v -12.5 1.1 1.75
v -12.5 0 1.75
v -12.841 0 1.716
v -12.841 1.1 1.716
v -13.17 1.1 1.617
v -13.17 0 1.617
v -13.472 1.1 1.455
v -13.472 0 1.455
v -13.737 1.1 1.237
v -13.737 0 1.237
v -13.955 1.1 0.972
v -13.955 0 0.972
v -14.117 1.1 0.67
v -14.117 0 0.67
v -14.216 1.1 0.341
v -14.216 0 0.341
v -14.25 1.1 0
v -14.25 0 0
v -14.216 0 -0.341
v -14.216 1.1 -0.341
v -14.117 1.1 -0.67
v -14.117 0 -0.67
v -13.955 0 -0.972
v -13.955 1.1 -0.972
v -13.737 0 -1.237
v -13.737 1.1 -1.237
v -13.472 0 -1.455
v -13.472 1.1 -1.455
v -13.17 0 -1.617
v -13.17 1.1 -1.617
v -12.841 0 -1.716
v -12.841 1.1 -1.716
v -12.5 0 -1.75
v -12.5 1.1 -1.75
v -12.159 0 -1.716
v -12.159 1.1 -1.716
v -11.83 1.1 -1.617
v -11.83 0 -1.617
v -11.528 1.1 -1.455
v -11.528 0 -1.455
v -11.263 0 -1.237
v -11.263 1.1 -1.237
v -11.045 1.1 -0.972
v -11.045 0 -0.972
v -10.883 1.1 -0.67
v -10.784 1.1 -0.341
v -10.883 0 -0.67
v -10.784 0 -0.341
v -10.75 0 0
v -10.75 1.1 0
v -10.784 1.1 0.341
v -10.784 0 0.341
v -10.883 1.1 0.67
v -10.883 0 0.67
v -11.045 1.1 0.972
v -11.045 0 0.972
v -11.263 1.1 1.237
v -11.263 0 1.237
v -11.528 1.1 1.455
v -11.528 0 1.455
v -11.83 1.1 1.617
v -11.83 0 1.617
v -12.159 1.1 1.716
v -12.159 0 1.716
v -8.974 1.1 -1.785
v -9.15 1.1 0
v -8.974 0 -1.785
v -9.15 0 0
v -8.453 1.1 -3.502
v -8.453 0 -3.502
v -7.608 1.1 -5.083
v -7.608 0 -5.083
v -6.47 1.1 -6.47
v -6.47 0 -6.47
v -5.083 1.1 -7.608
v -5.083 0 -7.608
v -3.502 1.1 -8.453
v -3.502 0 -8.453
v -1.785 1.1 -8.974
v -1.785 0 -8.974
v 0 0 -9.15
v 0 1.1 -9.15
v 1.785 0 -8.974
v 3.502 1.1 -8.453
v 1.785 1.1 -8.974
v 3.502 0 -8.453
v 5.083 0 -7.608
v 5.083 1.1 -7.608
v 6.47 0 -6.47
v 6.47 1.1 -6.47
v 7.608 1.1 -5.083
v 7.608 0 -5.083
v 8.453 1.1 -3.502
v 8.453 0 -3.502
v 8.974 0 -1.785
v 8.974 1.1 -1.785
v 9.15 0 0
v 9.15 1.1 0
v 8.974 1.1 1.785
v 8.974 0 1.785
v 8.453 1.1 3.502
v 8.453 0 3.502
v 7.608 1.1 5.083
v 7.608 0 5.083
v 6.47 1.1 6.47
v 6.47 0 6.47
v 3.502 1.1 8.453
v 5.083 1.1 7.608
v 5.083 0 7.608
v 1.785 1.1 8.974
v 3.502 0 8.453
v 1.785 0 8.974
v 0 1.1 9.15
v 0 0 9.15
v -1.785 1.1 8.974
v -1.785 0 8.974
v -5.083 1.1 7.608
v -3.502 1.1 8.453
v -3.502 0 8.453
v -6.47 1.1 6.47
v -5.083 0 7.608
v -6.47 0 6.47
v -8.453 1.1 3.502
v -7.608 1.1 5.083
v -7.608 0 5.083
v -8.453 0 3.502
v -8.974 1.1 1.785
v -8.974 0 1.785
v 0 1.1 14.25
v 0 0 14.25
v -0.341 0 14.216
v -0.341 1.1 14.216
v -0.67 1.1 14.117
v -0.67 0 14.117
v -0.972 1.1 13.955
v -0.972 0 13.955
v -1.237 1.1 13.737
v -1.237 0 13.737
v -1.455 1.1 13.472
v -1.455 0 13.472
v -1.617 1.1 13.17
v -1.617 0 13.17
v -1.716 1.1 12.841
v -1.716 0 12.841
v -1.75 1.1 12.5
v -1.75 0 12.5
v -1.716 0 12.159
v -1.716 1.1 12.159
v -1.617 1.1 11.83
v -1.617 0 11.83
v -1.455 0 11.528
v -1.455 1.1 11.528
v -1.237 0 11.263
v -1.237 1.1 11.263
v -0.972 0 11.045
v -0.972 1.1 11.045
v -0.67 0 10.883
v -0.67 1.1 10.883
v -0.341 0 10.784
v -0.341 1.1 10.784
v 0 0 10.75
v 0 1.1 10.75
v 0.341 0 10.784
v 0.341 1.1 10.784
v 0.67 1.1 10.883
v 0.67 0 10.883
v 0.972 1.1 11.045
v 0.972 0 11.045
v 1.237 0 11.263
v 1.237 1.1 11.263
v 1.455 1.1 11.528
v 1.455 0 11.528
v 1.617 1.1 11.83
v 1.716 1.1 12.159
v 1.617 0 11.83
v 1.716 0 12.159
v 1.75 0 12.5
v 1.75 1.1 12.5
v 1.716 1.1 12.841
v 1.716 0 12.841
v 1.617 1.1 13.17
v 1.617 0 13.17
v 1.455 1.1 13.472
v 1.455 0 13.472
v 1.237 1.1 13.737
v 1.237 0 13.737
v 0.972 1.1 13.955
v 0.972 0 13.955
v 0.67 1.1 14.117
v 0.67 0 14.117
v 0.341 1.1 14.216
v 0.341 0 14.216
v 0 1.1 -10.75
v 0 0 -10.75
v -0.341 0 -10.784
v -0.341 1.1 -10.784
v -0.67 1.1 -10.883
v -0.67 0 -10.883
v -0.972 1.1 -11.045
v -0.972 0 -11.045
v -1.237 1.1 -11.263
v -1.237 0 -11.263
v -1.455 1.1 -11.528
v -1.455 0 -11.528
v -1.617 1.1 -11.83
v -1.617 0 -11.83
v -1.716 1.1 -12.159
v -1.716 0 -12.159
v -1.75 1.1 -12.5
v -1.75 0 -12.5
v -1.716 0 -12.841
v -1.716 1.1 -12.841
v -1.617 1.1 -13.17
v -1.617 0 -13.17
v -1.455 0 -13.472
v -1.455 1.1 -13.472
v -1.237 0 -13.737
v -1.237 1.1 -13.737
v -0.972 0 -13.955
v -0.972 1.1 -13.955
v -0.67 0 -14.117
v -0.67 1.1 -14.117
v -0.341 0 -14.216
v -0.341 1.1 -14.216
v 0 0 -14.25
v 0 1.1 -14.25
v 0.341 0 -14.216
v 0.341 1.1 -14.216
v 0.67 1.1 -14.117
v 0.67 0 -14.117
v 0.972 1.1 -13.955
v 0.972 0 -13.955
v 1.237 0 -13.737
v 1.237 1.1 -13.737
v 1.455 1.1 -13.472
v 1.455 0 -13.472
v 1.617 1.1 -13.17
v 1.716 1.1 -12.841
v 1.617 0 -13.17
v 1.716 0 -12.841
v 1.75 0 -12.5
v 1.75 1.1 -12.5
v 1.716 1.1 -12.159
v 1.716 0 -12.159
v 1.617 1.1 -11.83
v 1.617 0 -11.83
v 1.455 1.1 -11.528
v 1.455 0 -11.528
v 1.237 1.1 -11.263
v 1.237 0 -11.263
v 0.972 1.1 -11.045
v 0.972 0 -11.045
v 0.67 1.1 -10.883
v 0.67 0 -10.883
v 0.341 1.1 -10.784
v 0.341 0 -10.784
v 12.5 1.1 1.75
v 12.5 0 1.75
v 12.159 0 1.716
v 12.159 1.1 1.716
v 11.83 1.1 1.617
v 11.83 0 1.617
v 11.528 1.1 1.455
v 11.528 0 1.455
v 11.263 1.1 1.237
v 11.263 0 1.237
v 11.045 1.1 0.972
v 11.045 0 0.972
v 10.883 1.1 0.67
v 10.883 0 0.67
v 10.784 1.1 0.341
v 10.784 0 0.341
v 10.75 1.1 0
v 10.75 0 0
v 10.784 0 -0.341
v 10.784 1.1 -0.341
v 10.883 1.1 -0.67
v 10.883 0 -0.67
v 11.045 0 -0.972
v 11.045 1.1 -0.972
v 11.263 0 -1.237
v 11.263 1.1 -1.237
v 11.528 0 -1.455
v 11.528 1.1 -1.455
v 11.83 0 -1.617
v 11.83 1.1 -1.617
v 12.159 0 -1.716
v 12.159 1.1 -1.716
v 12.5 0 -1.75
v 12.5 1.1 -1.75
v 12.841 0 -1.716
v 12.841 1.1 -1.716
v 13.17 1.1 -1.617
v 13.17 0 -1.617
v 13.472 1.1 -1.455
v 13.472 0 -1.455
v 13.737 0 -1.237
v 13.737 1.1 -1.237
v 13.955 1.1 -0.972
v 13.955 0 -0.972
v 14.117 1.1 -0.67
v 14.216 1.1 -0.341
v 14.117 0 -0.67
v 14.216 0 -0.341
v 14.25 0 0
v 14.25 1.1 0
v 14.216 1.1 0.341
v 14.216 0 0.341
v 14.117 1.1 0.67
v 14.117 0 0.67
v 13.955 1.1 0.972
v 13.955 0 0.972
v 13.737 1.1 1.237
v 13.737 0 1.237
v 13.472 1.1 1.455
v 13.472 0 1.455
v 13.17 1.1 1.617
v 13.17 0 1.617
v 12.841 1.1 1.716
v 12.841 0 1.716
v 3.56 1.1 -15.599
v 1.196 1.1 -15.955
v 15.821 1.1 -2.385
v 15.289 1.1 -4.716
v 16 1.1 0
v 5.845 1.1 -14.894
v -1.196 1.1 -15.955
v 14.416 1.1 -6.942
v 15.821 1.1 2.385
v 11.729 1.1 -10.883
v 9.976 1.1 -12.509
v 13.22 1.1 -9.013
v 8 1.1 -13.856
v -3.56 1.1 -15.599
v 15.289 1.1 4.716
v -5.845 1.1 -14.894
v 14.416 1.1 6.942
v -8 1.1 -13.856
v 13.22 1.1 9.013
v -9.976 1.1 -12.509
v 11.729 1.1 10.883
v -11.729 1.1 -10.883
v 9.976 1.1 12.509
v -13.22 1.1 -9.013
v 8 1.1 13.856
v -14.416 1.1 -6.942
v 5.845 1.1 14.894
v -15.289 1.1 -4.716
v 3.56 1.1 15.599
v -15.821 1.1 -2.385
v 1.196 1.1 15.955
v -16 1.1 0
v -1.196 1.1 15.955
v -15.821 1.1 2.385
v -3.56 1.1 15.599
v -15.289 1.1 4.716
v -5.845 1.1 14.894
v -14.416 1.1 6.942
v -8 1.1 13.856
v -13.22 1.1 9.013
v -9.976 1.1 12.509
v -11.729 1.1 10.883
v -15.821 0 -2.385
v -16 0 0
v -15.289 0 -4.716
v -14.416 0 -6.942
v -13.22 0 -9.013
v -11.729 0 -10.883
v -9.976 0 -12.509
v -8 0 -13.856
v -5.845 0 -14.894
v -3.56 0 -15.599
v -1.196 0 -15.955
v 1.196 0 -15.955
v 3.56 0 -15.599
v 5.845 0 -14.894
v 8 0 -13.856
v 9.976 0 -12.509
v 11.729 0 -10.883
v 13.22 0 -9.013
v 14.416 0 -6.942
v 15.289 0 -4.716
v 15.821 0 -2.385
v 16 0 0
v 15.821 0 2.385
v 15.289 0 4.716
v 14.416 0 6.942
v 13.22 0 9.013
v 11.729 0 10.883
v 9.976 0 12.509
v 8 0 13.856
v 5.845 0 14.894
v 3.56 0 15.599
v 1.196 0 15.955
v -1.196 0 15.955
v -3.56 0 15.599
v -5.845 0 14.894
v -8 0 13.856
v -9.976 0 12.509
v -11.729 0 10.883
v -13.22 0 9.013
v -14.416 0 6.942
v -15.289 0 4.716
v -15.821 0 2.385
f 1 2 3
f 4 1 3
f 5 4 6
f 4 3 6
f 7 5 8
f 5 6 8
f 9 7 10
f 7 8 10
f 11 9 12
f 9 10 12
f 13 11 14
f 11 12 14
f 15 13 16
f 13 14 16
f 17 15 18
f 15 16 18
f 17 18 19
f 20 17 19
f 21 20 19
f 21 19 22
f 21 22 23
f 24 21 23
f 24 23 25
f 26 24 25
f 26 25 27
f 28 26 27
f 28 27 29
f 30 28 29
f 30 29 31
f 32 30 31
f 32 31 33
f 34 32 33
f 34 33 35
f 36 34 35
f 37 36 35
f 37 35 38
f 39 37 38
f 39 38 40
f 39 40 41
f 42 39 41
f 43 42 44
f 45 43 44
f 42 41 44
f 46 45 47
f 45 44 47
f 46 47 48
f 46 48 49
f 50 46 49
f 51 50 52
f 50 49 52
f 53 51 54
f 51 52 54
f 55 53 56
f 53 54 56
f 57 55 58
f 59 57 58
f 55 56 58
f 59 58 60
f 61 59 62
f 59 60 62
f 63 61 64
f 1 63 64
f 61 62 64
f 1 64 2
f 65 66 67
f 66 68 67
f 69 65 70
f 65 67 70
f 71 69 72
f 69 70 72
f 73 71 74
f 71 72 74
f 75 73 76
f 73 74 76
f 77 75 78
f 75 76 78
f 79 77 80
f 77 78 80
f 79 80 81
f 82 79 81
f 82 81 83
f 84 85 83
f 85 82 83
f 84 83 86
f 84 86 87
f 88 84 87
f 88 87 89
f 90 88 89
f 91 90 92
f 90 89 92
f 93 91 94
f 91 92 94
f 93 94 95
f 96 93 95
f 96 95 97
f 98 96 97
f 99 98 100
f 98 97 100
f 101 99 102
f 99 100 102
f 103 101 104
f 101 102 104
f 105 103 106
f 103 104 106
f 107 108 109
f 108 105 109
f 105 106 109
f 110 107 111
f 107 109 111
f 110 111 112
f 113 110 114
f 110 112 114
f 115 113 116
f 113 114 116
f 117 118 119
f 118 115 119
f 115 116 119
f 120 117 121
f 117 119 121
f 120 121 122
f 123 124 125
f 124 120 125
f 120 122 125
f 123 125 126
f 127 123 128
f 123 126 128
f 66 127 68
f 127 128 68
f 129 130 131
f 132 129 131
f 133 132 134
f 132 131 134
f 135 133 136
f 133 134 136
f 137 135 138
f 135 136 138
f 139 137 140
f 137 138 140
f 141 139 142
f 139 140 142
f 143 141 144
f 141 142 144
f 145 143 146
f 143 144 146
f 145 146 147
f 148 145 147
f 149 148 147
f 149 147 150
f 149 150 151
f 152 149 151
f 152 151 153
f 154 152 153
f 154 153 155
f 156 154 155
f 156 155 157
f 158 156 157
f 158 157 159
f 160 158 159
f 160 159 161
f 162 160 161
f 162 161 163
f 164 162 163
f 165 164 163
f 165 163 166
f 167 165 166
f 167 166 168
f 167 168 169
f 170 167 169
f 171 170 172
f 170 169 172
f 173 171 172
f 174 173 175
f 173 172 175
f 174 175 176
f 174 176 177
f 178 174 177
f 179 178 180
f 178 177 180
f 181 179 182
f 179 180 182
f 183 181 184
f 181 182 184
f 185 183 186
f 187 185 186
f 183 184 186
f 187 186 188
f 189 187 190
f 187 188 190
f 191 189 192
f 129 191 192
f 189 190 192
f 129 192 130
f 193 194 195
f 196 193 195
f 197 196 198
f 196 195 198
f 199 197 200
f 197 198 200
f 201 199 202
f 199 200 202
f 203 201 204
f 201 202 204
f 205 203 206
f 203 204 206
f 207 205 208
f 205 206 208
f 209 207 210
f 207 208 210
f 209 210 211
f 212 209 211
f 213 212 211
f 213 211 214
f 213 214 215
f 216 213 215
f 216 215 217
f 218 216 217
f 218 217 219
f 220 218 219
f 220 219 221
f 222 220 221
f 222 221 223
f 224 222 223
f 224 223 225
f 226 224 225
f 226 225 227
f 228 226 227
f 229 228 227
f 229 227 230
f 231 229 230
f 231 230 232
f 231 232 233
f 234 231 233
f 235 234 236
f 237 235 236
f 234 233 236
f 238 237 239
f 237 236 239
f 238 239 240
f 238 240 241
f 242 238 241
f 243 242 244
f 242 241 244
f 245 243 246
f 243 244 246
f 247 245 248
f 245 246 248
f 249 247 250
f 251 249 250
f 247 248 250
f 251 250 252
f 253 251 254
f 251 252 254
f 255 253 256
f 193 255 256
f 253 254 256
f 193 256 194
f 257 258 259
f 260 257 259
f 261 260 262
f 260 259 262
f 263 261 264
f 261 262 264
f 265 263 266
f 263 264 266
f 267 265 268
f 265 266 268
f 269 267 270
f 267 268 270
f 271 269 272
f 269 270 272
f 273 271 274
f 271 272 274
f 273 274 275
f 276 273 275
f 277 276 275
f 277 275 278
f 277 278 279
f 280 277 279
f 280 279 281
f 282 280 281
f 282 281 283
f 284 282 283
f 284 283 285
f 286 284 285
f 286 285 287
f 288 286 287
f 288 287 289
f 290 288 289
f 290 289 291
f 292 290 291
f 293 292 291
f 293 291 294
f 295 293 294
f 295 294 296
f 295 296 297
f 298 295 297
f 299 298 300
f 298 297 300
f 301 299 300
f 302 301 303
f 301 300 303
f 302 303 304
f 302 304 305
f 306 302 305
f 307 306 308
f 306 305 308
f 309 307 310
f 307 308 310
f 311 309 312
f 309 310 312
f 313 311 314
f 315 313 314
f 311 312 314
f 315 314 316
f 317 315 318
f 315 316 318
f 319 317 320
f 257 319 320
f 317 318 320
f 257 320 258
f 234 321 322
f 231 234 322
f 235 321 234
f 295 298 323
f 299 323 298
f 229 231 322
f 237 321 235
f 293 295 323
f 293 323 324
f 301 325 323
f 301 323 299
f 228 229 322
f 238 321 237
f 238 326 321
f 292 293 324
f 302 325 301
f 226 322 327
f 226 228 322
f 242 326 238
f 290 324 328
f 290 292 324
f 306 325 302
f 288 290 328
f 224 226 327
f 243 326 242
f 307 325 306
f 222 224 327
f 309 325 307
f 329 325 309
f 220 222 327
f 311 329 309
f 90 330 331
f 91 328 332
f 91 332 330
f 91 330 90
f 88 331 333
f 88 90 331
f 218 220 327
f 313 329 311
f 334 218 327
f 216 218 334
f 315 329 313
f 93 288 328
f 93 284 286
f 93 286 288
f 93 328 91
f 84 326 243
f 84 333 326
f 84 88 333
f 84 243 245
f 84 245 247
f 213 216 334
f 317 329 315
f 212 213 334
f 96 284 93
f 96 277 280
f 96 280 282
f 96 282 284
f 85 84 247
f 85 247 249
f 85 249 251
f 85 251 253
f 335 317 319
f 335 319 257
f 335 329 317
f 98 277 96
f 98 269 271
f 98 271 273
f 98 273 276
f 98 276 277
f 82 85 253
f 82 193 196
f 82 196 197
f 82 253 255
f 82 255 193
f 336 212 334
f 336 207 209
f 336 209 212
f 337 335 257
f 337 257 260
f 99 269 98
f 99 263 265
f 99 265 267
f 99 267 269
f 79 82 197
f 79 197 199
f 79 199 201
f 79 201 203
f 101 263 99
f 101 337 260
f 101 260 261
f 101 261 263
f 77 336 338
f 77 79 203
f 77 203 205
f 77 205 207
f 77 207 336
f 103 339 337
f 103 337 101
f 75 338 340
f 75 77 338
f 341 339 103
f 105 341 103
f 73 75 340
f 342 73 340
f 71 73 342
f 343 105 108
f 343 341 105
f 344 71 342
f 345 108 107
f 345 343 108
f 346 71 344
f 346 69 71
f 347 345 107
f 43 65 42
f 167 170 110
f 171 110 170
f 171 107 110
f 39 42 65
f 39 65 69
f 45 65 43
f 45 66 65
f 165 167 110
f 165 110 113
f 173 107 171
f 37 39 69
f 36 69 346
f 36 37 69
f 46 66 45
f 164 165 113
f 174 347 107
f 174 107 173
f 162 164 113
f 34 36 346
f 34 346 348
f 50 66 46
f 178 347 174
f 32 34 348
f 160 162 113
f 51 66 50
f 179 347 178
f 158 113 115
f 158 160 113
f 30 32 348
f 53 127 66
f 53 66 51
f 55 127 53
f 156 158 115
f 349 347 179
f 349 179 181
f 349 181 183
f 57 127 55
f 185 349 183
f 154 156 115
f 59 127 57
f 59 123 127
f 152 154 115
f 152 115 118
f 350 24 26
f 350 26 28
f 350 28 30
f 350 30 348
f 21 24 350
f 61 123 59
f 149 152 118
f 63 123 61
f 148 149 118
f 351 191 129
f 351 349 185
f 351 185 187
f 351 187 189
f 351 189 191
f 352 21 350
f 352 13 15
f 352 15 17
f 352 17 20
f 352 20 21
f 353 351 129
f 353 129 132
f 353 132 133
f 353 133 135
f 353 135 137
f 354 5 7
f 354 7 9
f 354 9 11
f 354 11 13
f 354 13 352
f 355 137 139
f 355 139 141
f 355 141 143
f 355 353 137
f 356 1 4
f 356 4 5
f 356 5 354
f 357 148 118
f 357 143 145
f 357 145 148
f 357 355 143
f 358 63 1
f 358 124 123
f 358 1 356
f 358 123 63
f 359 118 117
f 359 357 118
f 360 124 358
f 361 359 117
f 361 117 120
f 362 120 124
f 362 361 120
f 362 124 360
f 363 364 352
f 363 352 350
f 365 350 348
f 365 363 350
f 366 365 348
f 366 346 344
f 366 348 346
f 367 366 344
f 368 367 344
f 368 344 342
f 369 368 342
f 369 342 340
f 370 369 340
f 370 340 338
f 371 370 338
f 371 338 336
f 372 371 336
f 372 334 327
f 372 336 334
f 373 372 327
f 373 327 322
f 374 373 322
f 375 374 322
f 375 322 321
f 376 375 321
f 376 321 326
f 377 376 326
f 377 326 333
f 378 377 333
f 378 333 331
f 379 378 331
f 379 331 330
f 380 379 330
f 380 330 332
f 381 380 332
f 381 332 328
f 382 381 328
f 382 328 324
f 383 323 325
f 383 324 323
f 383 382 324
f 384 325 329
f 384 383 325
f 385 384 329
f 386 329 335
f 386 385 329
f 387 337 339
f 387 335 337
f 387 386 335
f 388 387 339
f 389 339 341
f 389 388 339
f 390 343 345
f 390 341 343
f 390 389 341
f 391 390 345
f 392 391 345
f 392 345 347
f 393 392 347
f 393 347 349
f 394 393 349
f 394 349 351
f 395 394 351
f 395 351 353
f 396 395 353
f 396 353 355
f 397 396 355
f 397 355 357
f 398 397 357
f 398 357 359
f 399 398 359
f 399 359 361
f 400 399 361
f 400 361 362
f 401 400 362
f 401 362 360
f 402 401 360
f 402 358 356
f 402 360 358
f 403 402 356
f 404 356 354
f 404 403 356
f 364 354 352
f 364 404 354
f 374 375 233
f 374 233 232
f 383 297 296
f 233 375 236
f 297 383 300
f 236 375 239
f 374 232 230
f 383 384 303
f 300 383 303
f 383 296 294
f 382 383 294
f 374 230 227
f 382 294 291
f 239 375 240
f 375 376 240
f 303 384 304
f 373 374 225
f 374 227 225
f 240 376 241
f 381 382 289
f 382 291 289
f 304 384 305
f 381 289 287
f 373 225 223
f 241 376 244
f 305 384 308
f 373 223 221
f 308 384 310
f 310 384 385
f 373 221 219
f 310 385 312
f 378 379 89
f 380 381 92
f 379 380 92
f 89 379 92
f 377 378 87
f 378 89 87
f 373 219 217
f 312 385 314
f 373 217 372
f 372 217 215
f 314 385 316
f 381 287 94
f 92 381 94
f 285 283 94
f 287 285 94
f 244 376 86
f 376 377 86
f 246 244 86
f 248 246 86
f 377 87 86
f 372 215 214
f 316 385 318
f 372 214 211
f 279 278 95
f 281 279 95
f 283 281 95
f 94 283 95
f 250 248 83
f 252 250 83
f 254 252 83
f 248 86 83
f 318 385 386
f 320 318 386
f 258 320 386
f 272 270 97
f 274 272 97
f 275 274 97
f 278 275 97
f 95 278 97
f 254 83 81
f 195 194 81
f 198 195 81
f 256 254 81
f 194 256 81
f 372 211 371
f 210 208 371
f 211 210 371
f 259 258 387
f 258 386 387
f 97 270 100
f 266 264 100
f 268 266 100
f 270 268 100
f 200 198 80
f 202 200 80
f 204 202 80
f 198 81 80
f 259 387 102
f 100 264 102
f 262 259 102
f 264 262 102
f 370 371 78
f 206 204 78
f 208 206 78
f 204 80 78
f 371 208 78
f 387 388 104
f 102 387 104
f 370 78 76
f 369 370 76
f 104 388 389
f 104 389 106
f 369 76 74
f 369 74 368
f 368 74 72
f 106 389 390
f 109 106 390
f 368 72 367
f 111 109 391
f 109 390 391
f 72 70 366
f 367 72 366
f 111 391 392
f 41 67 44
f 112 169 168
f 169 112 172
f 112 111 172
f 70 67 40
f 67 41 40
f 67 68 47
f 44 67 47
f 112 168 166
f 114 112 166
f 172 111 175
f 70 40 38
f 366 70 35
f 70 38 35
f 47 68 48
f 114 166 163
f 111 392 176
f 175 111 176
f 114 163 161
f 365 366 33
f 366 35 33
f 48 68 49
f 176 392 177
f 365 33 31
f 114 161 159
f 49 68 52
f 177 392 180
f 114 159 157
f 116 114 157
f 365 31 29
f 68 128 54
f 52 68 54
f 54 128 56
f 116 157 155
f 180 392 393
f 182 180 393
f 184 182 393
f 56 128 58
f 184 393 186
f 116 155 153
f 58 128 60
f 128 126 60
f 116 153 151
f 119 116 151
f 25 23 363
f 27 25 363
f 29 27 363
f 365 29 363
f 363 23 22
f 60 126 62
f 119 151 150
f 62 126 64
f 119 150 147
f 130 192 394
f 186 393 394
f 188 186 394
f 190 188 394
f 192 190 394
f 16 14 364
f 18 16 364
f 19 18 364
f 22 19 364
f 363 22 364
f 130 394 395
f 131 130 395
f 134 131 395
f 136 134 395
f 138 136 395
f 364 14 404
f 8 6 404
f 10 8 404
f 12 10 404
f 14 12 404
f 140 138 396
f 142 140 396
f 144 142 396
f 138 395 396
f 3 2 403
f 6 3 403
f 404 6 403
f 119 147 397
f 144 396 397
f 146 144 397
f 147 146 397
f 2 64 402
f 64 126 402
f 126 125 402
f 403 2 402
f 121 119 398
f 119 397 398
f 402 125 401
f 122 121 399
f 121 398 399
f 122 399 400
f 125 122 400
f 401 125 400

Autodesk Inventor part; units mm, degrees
ref_plane "YZ Plane" through (0, 0, 0) normal (1, 0, 0) x (0, 1, 0)
ref_plane "XZ Plane" through (0, 0, 0) normal (0, 1, 0) x (-1, 0, 0)
ref_plane "XY Plane" through (0, 0, 0) normal (0, 0, 1) x (1, 0, 0)
sketch "スケッチ1" plane through (0, 0, 0) normal (0, 1, 0) x (-1, 0, 0)
  circle A0 centre (0, 0) radius 9.15
  circle A1 centre (0, 0) radius 16
  dimension "d0" = 18.3
  dimension "d1" = 32
extrude "押し出し1" add sketch "スケッチ1" along normal blind 1.1
sketch "スケッチ2" plane through (0, 1.1, 0) normal (0, 1, 0) x (1, 0, 0)
  circle A0 centre (0, 0) radius 12.5 construction
  point P0 (-12.5, 0)
  point P1 (0, 12.5)
  point P2 (12.5, 0)
  point P3 (0, -12.5)
  dimension "d4" = 25
hole "穴1" at (-12.5, 1.1, 0) at (0, 1.1, -12.5) at (12.5, 1.1, 0) at (0, 1.1, 12.5) direction (0, -1, 0) diameter 3.5 end through all
properties part number "shoulder2_shaftholder_spacer"
